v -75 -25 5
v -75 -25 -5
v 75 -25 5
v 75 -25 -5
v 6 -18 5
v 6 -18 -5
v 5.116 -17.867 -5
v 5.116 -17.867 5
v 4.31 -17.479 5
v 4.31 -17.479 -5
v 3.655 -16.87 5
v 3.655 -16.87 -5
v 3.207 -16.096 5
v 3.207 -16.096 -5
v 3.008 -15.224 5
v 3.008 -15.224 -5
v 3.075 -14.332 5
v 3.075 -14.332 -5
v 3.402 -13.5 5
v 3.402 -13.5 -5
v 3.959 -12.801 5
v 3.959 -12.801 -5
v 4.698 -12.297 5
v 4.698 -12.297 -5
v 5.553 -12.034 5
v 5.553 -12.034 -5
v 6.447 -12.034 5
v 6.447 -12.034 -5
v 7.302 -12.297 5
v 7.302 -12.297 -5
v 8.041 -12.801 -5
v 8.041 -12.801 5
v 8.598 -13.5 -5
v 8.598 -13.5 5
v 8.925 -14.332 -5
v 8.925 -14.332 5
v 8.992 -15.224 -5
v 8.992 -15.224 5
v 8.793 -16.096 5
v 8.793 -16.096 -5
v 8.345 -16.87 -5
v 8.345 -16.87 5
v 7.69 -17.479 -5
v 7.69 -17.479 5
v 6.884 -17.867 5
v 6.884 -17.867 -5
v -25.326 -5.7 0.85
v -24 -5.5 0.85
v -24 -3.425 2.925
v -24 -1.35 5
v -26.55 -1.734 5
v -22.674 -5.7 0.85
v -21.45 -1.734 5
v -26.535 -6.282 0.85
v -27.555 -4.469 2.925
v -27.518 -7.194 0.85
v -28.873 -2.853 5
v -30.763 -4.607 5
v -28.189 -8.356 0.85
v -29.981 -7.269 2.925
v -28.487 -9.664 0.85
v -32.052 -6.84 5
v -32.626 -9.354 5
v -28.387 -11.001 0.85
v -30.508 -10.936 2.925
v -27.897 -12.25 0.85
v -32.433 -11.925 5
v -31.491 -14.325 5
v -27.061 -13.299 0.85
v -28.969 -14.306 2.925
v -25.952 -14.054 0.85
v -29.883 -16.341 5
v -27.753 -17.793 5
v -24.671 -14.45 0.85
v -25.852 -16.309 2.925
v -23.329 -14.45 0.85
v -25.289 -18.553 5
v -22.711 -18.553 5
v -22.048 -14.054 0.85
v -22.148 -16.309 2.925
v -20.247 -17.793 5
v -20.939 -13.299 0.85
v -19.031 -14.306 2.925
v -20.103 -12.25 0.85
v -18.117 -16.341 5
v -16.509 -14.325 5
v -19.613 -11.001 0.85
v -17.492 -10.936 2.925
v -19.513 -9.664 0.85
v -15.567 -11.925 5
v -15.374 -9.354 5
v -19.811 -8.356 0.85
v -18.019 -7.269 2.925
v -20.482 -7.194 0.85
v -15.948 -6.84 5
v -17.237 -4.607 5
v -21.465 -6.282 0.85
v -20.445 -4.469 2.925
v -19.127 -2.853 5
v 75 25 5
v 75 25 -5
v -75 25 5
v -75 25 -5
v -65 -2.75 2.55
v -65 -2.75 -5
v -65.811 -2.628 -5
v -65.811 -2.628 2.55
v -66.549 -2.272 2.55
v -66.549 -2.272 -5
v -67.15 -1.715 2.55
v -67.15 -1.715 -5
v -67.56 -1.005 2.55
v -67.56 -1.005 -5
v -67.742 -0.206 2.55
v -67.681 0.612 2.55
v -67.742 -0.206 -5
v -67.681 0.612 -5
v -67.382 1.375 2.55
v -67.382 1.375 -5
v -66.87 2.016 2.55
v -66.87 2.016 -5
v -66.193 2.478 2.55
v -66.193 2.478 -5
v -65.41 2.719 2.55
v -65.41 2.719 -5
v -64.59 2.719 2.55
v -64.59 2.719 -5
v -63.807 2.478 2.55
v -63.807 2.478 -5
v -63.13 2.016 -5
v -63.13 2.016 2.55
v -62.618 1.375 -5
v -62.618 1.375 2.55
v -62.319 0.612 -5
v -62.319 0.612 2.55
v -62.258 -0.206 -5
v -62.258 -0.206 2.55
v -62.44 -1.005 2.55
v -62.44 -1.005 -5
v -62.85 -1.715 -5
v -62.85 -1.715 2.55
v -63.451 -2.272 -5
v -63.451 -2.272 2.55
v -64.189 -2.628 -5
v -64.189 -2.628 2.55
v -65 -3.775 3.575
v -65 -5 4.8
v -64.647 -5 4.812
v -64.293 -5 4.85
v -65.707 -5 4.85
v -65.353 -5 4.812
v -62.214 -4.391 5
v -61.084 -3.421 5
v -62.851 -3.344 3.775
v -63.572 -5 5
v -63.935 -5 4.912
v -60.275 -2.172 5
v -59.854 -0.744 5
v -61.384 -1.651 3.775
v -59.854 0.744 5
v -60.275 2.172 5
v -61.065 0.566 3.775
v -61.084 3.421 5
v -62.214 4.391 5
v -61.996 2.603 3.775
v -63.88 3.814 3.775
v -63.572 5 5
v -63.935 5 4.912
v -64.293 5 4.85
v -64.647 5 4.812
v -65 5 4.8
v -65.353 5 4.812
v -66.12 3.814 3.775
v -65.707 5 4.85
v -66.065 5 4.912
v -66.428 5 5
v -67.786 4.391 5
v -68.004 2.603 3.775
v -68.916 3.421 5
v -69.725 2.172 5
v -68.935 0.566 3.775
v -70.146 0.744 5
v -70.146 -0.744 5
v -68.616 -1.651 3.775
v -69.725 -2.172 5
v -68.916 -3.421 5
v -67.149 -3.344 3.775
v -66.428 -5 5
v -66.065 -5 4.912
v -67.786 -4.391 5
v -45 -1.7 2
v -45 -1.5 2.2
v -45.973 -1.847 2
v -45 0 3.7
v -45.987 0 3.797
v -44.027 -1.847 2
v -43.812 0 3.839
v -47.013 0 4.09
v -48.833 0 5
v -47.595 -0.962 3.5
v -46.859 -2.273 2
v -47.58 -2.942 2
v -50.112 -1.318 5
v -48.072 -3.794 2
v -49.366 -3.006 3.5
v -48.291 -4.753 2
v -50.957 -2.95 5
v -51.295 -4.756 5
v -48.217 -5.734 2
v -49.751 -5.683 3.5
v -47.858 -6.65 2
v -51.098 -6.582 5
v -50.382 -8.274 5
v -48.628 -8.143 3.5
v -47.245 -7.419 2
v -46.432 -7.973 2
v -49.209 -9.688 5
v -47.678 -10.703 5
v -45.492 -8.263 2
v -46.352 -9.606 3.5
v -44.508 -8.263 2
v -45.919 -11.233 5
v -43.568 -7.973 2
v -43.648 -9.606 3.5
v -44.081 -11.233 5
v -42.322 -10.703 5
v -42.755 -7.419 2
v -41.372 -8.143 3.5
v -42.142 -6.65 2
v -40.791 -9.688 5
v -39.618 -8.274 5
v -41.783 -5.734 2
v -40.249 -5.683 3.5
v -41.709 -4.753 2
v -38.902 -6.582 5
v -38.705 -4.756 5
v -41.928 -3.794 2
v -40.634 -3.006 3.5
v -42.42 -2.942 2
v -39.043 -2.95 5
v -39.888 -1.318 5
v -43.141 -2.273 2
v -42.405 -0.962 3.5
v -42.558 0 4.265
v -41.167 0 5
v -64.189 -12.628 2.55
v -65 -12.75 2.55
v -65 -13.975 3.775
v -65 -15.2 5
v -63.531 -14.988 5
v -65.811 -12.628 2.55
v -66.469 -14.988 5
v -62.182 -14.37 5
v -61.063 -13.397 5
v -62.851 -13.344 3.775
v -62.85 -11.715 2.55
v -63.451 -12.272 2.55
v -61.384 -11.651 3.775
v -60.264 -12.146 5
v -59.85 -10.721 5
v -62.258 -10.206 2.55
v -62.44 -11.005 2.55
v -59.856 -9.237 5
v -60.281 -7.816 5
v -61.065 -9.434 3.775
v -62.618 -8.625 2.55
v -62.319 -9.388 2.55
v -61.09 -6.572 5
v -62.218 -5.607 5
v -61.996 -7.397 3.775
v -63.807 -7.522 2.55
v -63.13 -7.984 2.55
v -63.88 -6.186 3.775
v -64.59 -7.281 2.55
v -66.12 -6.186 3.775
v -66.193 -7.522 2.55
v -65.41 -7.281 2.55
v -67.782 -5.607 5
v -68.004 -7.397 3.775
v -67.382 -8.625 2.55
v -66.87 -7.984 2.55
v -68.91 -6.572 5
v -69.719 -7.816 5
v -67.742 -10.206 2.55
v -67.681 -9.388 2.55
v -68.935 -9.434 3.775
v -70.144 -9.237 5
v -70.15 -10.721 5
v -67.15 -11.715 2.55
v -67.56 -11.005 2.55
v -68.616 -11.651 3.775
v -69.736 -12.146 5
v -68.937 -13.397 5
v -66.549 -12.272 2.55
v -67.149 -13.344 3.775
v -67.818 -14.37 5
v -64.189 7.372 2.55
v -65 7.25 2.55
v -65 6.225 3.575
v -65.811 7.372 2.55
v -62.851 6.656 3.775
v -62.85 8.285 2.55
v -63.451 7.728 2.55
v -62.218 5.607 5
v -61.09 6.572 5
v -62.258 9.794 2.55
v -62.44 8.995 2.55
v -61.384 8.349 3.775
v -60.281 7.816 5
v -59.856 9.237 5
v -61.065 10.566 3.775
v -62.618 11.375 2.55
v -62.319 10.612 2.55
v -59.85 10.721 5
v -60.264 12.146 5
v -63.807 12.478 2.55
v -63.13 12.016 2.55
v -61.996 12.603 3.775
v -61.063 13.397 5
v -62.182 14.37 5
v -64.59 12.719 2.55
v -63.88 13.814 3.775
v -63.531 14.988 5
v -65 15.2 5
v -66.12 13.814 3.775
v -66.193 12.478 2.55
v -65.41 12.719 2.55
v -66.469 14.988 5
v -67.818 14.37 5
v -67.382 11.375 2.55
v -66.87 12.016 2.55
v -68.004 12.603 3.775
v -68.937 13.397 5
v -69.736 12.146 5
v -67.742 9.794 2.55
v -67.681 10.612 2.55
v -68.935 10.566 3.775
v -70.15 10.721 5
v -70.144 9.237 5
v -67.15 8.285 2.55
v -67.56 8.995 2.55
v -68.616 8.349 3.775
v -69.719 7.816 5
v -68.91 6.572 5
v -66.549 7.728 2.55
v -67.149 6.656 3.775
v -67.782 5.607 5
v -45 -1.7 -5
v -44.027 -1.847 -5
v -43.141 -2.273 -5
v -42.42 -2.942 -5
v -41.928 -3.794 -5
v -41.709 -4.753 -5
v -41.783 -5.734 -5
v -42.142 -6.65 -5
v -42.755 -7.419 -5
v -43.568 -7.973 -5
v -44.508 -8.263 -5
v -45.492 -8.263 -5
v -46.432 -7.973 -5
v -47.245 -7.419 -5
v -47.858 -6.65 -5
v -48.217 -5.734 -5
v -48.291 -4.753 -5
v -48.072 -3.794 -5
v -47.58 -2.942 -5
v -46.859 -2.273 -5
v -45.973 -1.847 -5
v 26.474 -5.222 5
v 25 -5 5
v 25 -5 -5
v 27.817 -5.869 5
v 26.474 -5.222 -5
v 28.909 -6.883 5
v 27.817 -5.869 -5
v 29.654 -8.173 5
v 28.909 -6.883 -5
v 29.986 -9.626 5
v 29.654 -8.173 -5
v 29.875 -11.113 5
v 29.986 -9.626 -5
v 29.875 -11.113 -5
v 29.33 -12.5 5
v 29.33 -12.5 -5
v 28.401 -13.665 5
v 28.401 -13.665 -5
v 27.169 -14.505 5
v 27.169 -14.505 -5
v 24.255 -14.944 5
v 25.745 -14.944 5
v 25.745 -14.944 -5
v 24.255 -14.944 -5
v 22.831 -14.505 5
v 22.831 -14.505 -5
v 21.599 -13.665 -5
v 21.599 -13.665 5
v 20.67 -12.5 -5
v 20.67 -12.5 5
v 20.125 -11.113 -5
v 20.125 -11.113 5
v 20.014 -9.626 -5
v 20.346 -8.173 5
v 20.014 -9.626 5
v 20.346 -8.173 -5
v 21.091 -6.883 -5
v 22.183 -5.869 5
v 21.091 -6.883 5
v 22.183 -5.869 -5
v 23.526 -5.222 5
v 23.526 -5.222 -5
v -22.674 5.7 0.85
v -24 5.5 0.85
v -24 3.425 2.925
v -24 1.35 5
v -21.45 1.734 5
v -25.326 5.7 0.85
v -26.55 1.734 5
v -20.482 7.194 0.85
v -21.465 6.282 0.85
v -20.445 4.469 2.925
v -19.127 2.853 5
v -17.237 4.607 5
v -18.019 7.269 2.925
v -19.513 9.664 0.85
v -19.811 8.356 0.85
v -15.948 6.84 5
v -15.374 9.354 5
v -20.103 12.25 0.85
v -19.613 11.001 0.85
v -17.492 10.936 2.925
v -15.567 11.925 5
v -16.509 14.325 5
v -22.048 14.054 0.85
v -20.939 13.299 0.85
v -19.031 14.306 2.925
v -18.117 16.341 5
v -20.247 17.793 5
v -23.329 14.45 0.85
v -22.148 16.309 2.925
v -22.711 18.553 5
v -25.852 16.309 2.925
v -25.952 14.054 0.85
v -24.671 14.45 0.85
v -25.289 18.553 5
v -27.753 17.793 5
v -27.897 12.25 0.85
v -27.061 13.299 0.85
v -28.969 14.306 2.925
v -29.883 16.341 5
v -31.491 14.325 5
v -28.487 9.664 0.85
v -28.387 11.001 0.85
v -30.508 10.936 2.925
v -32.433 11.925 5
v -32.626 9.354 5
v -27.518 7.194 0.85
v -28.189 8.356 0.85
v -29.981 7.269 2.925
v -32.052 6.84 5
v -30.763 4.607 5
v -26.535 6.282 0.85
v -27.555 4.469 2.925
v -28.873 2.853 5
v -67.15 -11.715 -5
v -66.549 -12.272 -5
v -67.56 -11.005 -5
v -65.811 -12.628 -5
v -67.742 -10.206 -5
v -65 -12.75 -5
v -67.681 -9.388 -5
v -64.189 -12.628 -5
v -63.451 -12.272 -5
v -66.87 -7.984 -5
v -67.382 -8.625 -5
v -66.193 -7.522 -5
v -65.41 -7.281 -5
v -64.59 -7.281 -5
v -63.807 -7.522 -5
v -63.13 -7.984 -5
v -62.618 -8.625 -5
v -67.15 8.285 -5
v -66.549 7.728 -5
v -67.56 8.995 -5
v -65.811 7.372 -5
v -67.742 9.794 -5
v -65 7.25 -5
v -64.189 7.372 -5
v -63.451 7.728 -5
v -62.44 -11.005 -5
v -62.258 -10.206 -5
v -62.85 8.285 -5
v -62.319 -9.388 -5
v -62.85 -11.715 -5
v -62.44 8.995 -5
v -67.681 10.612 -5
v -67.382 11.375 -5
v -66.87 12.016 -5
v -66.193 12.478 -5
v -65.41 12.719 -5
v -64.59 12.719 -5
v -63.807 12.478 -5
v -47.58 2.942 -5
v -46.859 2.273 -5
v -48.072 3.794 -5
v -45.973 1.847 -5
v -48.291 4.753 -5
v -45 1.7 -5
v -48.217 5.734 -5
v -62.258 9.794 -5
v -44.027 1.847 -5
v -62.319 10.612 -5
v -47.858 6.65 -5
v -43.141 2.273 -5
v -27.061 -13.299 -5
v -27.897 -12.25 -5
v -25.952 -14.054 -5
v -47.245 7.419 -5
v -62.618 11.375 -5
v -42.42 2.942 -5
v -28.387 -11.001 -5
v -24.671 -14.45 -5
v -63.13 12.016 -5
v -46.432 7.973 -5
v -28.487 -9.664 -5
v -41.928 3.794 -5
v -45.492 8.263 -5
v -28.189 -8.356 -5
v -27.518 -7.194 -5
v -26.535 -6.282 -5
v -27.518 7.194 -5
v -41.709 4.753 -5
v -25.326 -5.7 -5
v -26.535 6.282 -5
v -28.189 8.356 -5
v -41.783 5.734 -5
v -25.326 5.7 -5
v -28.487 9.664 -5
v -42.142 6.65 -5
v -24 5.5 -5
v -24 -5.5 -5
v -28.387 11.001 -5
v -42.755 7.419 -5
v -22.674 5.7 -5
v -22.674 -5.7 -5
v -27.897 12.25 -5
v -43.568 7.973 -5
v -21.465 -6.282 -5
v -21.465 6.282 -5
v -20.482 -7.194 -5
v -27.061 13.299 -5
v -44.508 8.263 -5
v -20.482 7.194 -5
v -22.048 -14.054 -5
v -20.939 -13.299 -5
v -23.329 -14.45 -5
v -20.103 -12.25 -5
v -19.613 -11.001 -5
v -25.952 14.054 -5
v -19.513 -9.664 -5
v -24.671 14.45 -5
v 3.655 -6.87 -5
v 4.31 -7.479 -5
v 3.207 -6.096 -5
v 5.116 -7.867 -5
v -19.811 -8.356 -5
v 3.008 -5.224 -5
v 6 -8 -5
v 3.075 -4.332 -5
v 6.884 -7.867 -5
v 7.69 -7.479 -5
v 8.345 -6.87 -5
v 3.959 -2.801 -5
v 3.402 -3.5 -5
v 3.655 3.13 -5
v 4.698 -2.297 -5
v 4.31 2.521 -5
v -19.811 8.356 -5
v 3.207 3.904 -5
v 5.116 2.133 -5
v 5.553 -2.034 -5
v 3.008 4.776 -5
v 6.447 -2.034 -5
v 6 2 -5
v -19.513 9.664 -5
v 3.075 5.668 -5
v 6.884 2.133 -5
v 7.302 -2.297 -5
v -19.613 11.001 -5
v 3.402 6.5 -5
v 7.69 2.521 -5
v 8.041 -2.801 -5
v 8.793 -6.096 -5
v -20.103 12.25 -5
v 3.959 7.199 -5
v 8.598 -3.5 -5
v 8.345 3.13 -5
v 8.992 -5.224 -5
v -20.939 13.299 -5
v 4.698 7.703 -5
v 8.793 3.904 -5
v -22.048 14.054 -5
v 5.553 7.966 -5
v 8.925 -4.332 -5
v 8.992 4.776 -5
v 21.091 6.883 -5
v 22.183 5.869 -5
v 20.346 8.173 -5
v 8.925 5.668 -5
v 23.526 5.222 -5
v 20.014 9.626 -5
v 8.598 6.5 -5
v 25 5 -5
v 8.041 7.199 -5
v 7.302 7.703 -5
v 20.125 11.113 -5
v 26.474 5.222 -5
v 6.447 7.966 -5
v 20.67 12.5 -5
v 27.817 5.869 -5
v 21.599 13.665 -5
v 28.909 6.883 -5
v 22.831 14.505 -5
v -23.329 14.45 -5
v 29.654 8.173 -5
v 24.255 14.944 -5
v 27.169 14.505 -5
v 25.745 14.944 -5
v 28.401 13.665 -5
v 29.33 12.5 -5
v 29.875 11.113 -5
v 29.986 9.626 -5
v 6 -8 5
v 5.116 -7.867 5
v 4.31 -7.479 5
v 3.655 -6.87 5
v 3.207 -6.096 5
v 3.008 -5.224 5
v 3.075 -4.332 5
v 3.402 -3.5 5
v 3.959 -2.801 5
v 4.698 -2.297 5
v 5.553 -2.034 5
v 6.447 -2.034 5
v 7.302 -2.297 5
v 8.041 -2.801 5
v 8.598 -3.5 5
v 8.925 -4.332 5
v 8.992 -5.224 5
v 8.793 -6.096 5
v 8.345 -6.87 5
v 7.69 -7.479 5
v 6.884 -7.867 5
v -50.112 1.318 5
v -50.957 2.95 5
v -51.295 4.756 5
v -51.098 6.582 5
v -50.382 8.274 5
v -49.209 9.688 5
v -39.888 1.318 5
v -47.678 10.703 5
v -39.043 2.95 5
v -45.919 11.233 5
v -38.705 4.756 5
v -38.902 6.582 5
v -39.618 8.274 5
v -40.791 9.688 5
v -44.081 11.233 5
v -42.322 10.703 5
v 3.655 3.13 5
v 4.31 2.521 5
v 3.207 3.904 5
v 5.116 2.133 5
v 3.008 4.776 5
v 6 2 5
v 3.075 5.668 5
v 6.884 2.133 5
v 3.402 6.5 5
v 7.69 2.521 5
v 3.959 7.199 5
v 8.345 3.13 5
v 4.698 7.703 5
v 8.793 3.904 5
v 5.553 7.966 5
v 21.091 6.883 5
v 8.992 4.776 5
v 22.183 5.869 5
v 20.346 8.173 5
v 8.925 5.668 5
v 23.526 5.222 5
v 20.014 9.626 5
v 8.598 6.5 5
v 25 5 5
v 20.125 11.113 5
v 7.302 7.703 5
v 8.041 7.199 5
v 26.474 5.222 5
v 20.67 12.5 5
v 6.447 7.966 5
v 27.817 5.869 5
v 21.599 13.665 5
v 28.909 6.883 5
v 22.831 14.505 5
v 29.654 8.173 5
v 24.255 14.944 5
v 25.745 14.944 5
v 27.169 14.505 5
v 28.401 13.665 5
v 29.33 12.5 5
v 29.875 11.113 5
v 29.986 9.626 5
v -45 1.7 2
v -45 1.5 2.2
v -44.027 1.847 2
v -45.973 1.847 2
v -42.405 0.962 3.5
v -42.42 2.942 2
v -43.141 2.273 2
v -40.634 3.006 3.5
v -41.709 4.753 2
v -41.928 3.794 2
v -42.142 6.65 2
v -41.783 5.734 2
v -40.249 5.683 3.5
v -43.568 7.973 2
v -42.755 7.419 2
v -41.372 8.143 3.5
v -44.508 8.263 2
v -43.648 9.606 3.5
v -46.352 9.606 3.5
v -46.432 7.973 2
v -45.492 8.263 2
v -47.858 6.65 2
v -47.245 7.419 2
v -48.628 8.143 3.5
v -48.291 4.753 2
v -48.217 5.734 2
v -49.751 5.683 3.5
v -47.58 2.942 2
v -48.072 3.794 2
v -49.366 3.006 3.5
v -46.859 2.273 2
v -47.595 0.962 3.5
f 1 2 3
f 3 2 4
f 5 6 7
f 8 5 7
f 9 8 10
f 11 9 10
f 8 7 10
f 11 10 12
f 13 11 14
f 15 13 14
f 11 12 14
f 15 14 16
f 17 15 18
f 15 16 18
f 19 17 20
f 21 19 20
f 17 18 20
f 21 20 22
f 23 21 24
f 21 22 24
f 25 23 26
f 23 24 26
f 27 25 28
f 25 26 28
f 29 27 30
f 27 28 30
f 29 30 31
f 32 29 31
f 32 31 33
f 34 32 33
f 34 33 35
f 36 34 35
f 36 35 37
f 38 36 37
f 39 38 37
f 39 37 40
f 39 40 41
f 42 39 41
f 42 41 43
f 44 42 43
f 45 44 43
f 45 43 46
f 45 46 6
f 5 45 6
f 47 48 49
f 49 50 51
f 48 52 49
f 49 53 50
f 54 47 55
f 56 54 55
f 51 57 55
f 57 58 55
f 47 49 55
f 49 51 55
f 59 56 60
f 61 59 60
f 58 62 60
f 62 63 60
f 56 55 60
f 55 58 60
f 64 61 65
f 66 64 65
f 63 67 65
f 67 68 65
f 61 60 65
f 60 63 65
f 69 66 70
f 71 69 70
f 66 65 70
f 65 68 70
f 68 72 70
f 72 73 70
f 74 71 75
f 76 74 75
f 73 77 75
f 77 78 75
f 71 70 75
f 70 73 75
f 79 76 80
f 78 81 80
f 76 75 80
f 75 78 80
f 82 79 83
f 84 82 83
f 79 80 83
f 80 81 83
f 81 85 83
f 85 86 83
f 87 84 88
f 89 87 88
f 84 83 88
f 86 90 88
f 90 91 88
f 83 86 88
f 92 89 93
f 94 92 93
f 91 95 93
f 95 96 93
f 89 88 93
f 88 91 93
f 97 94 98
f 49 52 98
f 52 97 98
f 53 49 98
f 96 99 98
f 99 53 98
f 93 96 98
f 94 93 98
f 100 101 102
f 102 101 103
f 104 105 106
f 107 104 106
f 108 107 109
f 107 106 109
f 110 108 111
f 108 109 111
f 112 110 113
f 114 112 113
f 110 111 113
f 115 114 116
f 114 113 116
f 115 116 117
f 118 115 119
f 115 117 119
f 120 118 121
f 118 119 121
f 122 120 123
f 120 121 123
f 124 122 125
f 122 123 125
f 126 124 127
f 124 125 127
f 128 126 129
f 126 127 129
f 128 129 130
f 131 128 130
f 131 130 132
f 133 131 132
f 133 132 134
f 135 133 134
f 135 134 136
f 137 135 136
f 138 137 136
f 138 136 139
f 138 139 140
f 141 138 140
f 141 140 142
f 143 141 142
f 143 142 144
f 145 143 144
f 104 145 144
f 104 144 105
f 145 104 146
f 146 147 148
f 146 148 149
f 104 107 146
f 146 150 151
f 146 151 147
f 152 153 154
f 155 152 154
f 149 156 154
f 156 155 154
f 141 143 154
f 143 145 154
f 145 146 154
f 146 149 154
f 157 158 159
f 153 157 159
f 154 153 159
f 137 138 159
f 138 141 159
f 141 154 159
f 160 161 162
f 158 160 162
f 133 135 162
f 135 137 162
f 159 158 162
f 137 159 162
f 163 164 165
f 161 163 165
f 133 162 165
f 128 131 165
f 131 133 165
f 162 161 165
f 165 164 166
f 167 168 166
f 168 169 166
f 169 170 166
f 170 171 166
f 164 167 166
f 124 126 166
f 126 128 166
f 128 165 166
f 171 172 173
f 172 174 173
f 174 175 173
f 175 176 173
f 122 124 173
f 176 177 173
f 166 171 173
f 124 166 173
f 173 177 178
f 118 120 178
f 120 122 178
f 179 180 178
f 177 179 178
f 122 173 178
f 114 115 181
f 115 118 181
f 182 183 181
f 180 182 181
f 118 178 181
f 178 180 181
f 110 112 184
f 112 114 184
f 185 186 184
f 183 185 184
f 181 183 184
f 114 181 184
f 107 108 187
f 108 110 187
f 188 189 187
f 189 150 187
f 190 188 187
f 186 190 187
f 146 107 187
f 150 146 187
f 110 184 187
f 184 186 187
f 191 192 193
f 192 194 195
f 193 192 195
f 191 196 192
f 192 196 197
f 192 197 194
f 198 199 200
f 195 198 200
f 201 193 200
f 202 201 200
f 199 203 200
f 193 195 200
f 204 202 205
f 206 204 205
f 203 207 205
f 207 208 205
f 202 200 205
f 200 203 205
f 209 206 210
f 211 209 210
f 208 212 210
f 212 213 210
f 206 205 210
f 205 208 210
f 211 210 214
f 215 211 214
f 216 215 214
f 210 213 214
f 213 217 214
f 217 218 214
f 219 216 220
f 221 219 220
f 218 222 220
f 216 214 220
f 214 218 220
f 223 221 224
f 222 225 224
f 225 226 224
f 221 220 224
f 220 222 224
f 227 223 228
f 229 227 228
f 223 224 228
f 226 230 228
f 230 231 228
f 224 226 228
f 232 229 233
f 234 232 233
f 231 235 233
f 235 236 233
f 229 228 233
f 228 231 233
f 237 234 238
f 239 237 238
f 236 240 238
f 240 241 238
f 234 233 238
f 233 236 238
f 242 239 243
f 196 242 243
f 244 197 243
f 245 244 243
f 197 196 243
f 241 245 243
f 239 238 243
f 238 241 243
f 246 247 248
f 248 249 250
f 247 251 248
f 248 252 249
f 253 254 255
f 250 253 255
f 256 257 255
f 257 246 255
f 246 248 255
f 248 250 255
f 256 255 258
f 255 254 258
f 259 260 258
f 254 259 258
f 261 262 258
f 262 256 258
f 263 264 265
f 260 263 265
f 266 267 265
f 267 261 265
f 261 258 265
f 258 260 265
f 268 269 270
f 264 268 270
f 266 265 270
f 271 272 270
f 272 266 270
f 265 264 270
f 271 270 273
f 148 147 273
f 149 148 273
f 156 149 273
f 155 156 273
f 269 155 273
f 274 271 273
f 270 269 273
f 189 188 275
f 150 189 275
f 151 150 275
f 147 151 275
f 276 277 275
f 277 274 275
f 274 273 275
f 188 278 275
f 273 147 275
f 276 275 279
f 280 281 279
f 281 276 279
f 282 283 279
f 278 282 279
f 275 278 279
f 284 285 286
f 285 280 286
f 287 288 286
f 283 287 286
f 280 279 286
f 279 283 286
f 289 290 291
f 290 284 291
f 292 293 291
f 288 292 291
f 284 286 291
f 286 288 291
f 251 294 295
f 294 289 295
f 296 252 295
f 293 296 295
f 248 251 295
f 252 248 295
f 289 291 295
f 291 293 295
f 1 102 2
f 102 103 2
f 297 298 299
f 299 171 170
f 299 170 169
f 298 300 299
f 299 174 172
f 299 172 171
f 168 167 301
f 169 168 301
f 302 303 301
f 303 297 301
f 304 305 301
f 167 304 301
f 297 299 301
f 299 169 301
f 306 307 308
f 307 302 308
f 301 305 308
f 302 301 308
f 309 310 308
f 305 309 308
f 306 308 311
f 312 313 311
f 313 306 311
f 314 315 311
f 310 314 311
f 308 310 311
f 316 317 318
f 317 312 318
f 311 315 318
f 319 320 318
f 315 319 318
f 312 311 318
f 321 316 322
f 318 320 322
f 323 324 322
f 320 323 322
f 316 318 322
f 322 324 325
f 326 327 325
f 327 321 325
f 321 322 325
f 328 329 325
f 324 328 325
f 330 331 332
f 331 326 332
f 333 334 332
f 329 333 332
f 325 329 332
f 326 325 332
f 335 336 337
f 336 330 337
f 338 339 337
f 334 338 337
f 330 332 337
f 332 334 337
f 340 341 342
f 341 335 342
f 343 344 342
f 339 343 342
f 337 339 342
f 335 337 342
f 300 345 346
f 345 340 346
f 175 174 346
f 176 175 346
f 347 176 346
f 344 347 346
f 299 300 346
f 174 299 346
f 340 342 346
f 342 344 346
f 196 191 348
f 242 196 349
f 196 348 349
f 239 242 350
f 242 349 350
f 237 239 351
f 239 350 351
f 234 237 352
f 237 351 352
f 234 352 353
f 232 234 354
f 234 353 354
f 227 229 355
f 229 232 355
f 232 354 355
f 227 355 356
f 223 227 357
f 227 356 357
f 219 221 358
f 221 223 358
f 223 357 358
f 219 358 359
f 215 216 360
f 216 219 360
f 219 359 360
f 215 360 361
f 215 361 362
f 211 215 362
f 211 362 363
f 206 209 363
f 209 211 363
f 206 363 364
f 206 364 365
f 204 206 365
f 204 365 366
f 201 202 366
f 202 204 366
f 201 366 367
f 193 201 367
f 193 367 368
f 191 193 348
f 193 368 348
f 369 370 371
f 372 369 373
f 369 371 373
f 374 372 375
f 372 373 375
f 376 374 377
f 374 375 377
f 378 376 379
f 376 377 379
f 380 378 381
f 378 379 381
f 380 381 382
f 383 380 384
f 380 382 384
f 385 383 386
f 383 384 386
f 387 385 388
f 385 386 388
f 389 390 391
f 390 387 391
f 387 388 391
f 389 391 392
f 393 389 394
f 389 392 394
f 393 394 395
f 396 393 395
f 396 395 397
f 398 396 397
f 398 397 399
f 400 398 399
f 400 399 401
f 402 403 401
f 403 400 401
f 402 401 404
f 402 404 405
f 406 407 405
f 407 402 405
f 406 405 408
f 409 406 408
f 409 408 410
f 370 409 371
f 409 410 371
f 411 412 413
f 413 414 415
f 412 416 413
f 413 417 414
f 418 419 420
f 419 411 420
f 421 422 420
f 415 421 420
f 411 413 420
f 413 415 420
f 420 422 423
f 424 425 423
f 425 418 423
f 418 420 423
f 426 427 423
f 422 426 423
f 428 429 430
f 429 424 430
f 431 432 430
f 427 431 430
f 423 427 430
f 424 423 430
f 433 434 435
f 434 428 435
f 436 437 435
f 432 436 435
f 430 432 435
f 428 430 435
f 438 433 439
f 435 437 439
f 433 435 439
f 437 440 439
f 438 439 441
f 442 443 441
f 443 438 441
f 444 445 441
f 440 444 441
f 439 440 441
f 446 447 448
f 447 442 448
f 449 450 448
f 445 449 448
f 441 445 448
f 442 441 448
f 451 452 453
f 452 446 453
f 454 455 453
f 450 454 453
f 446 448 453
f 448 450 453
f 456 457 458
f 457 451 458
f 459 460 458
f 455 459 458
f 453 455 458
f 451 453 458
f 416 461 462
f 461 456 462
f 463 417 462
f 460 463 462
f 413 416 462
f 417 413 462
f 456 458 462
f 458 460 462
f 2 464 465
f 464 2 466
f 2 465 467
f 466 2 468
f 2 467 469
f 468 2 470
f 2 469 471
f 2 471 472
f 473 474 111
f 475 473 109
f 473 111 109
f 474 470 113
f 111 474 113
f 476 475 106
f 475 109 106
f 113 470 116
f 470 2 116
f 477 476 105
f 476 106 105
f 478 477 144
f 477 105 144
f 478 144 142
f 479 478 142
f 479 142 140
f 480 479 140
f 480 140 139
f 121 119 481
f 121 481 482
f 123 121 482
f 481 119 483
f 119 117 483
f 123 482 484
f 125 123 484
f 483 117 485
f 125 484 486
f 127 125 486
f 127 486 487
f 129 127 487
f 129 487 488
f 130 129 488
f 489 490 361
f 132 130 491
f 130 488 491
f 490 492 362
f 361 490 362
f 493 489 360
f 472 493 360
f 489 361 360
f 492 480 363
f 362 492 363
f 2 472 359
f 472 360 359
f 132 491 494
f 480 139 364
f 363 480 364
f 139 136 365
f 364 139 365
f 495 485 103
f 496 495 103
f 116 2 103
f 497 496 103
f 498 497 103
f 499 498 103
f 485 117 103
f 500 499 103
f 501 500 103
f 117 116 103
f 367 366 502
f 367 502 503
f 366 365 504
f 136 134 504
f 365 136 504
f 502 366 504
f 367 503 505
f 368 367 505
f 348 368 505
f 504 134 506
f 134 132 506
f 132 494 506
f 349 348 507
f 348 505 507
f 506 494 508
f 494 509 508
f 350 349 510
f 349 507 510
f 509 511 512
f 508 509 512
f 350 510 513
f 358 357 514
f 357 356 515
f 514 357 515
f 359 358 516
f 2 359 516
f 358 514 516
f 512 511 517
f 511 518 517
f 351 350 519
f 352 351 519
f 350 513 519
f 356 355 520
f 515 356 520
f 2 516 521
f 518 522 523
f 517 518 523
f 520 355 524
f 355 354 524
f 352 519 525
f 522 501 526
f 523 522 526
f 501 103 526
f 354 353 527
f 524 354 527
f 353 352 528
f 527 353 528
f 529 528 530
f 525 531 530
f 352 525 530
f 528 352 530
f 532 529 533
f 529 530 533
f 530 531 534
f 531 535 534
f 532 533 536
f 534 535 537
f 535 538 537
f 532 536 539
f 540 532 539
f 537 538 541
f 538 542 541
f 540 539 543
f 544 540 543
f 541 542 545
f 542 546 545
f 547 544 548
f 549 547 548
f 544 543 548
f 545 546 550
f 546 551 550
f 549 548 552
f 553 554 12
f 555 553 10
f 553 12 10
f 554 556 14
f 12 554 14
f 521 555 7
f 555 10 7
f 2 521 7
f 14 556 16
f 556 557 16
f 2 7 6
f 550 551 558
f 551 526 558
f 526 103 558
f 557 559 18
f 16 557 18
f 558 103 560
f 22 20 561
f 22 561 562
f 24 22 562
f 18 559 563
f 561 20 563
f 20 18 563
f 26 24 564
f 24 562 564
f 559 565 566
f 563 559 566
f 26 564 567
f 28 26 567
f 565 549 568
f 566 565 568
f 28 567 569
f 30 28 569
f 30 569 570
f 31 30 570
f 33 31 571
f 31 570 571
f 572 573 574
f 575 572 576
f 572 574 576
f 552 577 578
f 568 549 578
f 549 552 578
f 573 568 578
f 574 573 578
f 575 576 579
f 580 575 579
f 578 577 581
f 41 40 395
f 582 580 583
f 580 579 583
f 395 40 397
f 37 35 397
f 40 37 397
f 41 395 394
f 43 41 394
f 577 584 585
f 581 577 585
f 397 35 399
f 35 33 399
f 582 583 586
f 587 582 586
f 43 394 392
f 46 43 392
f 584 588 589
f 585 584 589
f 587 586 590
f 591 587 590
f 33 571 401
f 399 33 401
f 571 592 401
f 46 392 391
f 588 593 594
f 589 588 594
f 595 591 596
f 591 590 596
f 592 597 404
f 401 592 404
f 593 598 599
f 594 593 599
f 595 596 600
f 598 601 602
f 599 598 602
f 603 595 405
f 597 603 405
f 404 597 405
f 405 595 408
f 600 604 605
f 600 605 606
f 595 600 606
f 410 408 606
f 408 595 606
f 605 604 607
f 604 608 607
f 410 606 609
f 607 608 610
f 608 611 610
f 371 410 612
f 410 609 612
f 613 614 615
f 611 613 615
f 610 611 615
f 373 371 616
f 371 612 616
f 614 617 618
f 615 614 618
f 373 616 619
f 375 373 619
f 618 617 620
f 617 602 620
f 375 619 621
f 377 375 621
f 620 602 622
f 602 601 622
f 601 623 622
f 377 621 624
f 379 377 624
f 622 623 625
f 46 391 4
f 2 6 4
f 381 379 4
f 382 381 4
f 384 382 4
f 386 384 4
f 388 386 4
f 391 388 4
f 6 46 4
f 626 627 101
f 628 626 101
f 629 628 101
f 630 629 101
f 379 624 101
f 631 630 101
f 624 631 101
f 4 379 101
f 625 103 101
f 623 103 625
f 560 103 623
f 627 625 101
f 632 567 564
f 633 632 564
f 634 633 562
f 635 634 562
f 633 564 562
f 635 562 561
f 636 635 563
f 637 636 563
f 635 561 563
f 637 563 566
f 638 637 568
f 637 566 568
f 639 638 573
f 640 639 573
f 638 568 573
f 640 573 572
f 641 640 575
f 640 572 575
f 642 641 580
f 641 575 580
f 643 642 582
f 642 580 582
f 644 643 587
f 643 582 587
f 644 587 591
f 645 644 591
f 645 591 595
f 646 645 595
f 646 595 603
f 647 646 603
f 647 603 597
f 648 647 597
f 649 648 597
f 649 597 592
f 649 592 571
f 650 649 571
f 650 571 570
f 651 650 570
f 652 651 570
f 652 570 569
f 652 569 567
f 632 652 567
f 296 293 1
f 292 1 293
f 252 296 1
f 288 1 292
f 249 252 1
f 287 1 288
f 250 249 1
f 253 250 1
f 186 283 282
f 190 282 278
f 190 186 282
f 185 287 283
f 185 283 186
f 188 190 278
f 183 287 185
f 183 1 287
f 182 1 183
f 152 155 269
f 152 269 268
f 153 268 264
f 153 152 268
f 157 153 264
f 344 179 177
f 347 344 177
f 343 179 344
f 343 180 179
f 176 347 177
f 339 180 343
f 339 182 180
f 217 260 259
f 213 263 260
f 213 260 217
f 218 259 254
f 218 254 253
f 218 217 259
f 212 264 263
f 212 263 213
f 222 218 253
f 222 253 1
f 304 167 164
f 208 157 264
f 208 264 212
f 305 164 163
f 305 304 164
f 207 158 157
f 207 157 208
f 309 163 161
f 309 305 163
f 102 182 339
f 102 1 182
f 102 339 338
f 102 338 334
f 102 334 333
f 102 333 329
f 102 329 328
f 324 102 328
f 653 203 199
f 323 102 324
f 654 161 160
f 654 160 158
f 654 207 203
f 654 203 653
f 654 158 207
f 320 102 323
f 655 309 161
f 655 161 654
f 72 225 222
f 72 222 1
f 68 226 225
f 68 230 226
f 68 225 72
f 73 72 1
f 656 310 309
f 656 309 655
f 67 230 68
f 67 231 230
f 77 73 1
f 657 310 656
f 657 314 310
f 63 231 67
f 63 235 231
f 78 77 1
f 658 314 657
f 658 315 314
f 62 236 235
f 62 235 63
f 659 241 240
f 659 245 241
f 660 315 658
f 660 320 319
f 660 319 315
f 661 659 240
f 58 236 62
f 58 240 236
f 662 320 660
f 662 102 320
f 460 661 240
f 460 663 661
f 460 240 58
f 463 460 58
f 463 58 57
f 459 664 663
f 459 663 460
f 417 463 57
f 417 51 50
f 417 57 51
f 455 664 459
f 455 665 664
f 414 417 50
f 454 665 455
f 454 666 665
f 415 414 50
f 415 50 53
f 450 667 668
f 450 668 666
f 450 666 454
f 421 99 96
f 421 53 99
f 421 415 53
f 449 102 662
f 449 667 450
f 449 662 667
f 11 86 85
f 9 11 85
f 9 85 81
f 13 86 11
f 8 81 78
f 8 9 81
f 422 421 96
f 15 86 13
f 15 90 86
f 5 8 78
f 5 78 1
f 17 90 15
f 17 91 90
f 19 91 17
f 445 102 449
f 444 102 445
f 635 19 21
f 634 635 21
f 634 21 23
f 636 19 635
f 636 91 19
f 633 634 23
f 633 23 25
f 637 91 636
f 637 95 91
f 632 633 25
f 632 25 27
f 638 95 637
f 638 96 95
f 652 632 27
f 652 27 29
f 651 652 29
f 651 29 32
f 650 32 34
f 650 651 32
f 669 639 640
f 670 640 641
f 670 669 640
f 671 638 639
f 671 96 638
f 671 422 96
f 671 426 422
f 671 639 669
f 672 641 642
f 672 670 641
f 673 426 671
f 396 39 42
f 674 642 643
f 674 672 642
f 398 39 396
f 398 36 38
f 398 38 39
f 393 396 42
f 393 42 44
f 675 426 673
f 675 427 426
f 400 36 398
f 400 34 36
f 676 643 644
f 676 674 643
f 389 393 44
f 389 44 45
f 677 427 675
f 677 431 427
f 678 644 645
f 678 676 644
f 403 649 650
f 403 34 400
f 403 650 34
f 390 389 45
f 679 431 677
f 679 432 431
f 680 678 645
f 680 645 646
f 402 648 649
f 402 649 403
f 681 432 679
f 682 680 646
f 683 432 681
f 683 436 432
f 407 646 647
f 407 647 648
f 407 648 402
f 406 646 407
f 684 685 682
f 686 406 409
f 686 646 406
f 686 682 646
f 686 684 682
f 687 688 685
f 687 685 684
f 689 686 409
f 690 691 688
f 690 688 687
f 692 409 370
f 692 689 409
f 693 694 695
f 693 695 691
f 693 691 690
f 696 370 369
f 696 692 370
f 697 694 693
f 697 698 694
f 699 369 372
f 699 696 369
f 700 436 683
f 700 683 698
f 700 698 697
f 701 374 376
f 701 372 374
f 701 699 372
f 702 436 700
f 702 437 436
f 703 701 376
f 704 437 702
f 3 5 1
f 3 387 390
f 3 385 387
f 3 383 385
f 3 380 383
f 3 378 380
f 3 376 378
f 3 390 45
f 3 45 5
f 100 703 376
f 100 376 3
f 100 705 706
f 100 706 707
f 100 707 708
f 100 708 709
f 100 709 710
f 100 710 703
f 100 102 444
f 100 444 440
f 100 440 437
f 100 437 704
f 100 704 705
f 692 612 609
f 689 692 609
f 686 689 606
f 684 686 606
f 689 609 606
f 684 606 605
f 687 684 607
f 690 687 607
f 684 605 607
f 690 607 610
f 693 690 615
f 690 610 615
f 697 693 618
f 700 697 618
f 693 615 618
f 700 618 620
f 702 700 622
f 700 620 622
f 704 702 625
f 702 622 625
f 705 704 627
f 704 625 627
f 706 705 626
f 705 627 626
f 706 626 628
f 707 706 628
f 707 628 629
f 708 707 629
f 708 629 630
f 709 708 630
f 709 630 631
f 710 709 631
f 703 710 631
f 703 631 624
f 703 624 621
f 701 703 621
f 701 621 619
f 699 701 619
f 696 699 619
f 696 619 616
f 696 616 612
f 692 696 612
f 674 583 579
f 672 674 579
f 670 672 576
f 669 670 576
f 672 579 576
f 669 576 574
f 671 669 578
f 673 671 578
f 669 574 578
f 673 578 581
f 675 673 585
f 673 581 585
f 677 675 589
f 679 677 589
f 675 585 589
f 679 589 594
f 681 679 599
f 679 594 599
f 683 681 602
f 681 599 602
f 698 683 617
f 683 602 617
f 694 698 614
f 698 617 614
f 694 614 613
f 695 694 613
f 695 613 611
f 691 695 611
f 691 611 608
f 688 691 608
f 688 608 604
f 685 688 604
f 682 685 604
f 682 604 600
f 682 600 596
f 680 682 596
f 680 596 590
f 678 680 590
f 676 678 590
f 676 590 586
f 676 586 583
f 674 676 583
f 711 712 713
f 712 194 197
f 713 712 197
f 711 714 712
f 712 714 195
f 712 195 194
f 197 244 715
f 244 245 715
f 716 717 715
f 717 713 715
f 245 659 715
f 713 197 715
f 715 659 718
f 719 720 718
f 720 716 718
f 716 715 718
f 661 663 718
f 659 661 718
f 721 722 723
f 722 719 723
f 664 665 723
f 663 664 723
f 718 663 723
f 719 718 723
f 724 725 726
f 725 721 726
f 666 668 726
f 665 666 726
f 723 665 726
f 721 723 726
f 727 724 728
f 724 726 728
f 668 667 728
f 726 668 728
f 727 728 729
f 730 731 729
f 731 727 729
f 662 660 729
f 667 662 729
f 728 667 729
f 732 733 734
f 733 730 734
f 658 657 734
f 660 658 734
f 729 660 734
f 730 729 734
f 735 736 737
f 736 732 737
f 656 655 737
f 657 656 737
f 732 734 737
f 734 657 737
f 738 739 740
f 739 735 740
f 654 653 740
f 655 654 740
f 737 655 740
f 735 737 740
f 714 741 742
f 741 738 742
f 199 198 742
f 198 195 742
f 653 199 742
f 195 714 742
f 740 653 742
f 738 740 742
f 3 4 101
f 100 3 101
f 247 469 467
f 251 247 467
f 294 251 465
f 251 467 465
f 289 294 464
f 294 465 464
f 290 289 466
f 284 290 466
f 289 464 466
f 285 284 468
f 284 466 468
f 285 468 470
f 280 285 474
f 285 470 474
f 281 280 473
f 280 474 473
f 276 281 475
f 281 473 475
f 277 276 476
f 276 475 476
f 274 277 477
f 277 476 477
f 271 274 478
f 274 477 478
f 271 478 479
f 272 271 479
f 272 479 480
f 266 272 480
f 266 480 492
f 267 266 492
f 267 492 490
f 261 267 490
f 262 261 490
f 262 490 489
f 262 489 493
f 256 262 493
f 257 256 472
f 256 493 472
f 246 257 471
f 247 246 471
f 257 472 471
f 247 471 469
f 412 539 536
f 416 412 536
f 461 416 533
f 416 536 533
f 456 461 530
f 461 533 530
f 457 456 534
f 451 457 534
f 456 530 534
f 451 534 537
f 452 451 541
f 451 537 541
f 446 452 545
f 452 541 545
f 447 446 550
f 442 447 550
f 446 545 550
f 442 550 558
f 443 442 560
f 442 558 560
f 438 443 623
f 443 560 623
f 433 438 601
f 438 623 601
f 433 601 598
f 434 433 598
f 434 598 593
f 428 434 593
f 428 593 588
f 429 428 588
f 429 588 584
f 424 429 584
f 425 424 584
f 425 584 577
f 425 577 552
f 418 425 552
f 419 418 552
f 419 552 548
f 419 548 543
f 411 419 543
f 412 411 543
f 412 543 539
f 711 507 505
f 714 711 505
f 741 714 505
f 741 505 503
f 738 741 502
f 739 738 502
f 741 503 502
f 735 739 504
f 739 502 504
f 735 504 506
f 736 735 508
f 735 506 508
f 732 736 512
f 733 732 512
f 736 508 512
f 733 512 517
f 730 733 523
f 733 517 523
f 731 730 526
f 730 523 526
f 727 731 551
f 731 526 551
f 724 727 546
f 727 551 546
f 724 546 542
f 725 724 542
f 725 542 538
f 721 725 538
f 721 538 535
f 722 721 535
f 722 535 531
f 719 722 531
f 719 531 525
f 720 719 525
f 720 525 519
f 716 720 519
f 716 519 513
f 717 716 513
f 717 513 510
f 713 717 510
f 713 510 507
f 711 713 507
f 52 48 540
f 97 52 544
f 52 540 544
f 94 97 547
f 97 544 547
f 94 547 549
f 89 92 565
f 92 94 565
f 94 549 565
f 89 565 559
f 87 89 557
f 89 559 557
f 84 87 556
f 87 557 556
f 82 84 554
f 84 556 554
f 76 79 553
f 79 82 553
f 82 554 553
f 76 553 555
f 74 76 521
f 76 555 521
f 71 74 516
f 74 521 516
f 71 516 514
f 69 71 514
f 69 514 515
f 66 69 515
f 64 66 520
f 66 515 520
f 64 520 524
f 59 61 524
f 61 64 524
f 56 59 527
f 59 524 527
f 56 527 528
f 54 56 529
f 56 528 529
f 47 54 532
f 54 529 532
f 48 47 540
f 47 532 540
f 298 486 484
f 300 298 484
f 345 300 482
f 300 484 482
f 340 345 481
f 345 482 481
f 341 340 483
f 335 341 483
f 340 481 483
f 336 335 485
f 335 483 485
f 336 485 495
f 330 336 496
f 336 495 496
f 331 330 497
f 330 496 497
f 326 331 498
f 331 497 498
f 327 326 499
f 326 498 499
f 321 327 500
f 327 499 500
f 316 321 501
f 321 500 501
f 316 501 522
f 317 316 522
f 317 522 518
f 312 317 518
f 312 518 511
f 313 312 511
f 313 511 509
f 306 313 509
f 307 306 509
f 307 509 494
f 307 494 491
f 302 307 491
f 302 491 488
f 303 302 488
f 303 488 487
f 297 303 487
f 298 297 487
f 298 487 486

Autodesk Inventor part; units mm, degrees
ref_plane "YZ Plane" through (0, 0, 0) normal (1, 0, 0) x (0, 1, 0)
ref_plane "XZ Plane" through (0, 0, 0) normal (0, 1, 0) x (-1, 0, 0)
ref_plane "XY Plane" through (0, 0, 0) normal (0, 0, 1) x (1, 0, 0)
sketch "Sketch2" plane through (0, 0, 0) normal (0, 0, 1) x (1, 0, 0)
  line L0 (-75, -25) -> (75, -25)
  line L1 (75, -25) -> (75, 25)
  line L2 (75, 25) -> (-75, 25)
  line L3 (-75, 25) -> (-75, -25)
  line L4 (-75, -25) -> (75, 25) construction
  line L5 (75, -25) -> (-75, 25) construction
  point P0 (0, 0)
  dimension "d1" = 150
  dimension "d2" = 50
extrude "Extrusion1" add sketch "Sketch2" along normal mid plane 10
sketch "Sketch3" plane through (0, 0, 5) normal (0, 0, 1) x (1, 0, 0)
  line L0 (-75, 25) -> (-75, -25) projected
  line L1 (75, 25) -> (-75, 25) projected
  point P0 (0, 0)
  point P1 (-65, 0)
  dimension "d40" = 10
  dimension "d43" = 25
hole "Hole1" at (-65, 0, 5) direction (0, 0, -1) diameter 5.5 depth 14.2 tip angle 118 countersink diameter 10.4 countersink angle 90 clearance for "Counter Sink" size "M5" standard "TS Profile"
sketch "Sketch4" plane through (0, 0, 5) normal (0, 0, 1) x (1, 0, 0)
  line L0 (-75, 25) -> (-75, -25) projected
  line L1 (75, 25) -> (-75, 25) projected
  point P0 (0, 0)
  point P1 (-45, 5)
  dimension "d41" = 30
  dimension "d42" = 20
hole "Hole2" at (-45, 5, 5) direction (0, 0, -1) diameter 6.6 depth 17.1 tip angle 118 countersink diameter 12.6 countersink angle 90 clearance for "Counter Sink" size "M6" standard "TS Profile"
sketch "Sketch5" plane through (0, 0, 5) normal (0, 0, 1) x (1, 0, 0)
  line L0 (-75, 25) -> (-75, -25) projected
  line L1 (75, 25) -> (-75, 25) projected
  point P0 (0, 0)
  point P1 (-24, 10)
  dimension "d44" = 51
  dimension "d45" = 15
hole "Hole3" at (-24, 10, 5) direction (0, 0, -1) diameter 9 depth 22.2 tip angle 118 countersink diameter 17.3 countersink angle 90 clearance for "Counter Sink" size "M8" standard "TS Profile"
sketch "Sketch6" plane through (0, 0, 5) normal (0, 0, 1) x (1, 0, 0)
  line L0 (-75, 25) -> (-75, -25) projected
  line L1 (75, 25) -> (-75, 25) projected
  point P0 (0, 0)
  point P1 (6, 5)
  dimension "d46" = 81
  dimension "d47" = 20
hole "Hole4" at (6, 5, 5) direction (0, 0, -1) diameter 6 depth 14.2 tip angle 118
sketch "Sketch7" plane through (0, 0, 5) normal (0, 0, 1) x (1, 0, 0)
  line L0 (-75, 25) -> (-75, -25) projected
  line L1 (75, 25) -> (-75, 25) projected
  point P0 (0, 0)
  point P1 (25, 10)
  dimension "d48" = 100
  dimension "d49" = 15
hole "Hole5" at (25, 10, 5) direction (0, 0, -1) diameter 10 depth 14.2 tip angle 118
pattern_linear "Rectangular Pattern1" count 3 spacing 10 along (0, -1, 0) of "Hole1" first direction both ways yes
mirror "Mirror1" about plane through (0, 0, 0) normal (0, 1, 0) of "Hole2"
mirror "Mirror2" about plane through (0, 0, 0) normal (0, 1, 0) of "Hole3"
pattern_linear "Rectangular Pattern2" count 3 spacing 10 along (0, -1, 0) of "Hole4"
mirror "Mirror3" about plane through (0, 0, 0) normal (0, 1, 0) of "Hole5"
properties part number "홀간 거리 확인 파트-13" material "SS400"
